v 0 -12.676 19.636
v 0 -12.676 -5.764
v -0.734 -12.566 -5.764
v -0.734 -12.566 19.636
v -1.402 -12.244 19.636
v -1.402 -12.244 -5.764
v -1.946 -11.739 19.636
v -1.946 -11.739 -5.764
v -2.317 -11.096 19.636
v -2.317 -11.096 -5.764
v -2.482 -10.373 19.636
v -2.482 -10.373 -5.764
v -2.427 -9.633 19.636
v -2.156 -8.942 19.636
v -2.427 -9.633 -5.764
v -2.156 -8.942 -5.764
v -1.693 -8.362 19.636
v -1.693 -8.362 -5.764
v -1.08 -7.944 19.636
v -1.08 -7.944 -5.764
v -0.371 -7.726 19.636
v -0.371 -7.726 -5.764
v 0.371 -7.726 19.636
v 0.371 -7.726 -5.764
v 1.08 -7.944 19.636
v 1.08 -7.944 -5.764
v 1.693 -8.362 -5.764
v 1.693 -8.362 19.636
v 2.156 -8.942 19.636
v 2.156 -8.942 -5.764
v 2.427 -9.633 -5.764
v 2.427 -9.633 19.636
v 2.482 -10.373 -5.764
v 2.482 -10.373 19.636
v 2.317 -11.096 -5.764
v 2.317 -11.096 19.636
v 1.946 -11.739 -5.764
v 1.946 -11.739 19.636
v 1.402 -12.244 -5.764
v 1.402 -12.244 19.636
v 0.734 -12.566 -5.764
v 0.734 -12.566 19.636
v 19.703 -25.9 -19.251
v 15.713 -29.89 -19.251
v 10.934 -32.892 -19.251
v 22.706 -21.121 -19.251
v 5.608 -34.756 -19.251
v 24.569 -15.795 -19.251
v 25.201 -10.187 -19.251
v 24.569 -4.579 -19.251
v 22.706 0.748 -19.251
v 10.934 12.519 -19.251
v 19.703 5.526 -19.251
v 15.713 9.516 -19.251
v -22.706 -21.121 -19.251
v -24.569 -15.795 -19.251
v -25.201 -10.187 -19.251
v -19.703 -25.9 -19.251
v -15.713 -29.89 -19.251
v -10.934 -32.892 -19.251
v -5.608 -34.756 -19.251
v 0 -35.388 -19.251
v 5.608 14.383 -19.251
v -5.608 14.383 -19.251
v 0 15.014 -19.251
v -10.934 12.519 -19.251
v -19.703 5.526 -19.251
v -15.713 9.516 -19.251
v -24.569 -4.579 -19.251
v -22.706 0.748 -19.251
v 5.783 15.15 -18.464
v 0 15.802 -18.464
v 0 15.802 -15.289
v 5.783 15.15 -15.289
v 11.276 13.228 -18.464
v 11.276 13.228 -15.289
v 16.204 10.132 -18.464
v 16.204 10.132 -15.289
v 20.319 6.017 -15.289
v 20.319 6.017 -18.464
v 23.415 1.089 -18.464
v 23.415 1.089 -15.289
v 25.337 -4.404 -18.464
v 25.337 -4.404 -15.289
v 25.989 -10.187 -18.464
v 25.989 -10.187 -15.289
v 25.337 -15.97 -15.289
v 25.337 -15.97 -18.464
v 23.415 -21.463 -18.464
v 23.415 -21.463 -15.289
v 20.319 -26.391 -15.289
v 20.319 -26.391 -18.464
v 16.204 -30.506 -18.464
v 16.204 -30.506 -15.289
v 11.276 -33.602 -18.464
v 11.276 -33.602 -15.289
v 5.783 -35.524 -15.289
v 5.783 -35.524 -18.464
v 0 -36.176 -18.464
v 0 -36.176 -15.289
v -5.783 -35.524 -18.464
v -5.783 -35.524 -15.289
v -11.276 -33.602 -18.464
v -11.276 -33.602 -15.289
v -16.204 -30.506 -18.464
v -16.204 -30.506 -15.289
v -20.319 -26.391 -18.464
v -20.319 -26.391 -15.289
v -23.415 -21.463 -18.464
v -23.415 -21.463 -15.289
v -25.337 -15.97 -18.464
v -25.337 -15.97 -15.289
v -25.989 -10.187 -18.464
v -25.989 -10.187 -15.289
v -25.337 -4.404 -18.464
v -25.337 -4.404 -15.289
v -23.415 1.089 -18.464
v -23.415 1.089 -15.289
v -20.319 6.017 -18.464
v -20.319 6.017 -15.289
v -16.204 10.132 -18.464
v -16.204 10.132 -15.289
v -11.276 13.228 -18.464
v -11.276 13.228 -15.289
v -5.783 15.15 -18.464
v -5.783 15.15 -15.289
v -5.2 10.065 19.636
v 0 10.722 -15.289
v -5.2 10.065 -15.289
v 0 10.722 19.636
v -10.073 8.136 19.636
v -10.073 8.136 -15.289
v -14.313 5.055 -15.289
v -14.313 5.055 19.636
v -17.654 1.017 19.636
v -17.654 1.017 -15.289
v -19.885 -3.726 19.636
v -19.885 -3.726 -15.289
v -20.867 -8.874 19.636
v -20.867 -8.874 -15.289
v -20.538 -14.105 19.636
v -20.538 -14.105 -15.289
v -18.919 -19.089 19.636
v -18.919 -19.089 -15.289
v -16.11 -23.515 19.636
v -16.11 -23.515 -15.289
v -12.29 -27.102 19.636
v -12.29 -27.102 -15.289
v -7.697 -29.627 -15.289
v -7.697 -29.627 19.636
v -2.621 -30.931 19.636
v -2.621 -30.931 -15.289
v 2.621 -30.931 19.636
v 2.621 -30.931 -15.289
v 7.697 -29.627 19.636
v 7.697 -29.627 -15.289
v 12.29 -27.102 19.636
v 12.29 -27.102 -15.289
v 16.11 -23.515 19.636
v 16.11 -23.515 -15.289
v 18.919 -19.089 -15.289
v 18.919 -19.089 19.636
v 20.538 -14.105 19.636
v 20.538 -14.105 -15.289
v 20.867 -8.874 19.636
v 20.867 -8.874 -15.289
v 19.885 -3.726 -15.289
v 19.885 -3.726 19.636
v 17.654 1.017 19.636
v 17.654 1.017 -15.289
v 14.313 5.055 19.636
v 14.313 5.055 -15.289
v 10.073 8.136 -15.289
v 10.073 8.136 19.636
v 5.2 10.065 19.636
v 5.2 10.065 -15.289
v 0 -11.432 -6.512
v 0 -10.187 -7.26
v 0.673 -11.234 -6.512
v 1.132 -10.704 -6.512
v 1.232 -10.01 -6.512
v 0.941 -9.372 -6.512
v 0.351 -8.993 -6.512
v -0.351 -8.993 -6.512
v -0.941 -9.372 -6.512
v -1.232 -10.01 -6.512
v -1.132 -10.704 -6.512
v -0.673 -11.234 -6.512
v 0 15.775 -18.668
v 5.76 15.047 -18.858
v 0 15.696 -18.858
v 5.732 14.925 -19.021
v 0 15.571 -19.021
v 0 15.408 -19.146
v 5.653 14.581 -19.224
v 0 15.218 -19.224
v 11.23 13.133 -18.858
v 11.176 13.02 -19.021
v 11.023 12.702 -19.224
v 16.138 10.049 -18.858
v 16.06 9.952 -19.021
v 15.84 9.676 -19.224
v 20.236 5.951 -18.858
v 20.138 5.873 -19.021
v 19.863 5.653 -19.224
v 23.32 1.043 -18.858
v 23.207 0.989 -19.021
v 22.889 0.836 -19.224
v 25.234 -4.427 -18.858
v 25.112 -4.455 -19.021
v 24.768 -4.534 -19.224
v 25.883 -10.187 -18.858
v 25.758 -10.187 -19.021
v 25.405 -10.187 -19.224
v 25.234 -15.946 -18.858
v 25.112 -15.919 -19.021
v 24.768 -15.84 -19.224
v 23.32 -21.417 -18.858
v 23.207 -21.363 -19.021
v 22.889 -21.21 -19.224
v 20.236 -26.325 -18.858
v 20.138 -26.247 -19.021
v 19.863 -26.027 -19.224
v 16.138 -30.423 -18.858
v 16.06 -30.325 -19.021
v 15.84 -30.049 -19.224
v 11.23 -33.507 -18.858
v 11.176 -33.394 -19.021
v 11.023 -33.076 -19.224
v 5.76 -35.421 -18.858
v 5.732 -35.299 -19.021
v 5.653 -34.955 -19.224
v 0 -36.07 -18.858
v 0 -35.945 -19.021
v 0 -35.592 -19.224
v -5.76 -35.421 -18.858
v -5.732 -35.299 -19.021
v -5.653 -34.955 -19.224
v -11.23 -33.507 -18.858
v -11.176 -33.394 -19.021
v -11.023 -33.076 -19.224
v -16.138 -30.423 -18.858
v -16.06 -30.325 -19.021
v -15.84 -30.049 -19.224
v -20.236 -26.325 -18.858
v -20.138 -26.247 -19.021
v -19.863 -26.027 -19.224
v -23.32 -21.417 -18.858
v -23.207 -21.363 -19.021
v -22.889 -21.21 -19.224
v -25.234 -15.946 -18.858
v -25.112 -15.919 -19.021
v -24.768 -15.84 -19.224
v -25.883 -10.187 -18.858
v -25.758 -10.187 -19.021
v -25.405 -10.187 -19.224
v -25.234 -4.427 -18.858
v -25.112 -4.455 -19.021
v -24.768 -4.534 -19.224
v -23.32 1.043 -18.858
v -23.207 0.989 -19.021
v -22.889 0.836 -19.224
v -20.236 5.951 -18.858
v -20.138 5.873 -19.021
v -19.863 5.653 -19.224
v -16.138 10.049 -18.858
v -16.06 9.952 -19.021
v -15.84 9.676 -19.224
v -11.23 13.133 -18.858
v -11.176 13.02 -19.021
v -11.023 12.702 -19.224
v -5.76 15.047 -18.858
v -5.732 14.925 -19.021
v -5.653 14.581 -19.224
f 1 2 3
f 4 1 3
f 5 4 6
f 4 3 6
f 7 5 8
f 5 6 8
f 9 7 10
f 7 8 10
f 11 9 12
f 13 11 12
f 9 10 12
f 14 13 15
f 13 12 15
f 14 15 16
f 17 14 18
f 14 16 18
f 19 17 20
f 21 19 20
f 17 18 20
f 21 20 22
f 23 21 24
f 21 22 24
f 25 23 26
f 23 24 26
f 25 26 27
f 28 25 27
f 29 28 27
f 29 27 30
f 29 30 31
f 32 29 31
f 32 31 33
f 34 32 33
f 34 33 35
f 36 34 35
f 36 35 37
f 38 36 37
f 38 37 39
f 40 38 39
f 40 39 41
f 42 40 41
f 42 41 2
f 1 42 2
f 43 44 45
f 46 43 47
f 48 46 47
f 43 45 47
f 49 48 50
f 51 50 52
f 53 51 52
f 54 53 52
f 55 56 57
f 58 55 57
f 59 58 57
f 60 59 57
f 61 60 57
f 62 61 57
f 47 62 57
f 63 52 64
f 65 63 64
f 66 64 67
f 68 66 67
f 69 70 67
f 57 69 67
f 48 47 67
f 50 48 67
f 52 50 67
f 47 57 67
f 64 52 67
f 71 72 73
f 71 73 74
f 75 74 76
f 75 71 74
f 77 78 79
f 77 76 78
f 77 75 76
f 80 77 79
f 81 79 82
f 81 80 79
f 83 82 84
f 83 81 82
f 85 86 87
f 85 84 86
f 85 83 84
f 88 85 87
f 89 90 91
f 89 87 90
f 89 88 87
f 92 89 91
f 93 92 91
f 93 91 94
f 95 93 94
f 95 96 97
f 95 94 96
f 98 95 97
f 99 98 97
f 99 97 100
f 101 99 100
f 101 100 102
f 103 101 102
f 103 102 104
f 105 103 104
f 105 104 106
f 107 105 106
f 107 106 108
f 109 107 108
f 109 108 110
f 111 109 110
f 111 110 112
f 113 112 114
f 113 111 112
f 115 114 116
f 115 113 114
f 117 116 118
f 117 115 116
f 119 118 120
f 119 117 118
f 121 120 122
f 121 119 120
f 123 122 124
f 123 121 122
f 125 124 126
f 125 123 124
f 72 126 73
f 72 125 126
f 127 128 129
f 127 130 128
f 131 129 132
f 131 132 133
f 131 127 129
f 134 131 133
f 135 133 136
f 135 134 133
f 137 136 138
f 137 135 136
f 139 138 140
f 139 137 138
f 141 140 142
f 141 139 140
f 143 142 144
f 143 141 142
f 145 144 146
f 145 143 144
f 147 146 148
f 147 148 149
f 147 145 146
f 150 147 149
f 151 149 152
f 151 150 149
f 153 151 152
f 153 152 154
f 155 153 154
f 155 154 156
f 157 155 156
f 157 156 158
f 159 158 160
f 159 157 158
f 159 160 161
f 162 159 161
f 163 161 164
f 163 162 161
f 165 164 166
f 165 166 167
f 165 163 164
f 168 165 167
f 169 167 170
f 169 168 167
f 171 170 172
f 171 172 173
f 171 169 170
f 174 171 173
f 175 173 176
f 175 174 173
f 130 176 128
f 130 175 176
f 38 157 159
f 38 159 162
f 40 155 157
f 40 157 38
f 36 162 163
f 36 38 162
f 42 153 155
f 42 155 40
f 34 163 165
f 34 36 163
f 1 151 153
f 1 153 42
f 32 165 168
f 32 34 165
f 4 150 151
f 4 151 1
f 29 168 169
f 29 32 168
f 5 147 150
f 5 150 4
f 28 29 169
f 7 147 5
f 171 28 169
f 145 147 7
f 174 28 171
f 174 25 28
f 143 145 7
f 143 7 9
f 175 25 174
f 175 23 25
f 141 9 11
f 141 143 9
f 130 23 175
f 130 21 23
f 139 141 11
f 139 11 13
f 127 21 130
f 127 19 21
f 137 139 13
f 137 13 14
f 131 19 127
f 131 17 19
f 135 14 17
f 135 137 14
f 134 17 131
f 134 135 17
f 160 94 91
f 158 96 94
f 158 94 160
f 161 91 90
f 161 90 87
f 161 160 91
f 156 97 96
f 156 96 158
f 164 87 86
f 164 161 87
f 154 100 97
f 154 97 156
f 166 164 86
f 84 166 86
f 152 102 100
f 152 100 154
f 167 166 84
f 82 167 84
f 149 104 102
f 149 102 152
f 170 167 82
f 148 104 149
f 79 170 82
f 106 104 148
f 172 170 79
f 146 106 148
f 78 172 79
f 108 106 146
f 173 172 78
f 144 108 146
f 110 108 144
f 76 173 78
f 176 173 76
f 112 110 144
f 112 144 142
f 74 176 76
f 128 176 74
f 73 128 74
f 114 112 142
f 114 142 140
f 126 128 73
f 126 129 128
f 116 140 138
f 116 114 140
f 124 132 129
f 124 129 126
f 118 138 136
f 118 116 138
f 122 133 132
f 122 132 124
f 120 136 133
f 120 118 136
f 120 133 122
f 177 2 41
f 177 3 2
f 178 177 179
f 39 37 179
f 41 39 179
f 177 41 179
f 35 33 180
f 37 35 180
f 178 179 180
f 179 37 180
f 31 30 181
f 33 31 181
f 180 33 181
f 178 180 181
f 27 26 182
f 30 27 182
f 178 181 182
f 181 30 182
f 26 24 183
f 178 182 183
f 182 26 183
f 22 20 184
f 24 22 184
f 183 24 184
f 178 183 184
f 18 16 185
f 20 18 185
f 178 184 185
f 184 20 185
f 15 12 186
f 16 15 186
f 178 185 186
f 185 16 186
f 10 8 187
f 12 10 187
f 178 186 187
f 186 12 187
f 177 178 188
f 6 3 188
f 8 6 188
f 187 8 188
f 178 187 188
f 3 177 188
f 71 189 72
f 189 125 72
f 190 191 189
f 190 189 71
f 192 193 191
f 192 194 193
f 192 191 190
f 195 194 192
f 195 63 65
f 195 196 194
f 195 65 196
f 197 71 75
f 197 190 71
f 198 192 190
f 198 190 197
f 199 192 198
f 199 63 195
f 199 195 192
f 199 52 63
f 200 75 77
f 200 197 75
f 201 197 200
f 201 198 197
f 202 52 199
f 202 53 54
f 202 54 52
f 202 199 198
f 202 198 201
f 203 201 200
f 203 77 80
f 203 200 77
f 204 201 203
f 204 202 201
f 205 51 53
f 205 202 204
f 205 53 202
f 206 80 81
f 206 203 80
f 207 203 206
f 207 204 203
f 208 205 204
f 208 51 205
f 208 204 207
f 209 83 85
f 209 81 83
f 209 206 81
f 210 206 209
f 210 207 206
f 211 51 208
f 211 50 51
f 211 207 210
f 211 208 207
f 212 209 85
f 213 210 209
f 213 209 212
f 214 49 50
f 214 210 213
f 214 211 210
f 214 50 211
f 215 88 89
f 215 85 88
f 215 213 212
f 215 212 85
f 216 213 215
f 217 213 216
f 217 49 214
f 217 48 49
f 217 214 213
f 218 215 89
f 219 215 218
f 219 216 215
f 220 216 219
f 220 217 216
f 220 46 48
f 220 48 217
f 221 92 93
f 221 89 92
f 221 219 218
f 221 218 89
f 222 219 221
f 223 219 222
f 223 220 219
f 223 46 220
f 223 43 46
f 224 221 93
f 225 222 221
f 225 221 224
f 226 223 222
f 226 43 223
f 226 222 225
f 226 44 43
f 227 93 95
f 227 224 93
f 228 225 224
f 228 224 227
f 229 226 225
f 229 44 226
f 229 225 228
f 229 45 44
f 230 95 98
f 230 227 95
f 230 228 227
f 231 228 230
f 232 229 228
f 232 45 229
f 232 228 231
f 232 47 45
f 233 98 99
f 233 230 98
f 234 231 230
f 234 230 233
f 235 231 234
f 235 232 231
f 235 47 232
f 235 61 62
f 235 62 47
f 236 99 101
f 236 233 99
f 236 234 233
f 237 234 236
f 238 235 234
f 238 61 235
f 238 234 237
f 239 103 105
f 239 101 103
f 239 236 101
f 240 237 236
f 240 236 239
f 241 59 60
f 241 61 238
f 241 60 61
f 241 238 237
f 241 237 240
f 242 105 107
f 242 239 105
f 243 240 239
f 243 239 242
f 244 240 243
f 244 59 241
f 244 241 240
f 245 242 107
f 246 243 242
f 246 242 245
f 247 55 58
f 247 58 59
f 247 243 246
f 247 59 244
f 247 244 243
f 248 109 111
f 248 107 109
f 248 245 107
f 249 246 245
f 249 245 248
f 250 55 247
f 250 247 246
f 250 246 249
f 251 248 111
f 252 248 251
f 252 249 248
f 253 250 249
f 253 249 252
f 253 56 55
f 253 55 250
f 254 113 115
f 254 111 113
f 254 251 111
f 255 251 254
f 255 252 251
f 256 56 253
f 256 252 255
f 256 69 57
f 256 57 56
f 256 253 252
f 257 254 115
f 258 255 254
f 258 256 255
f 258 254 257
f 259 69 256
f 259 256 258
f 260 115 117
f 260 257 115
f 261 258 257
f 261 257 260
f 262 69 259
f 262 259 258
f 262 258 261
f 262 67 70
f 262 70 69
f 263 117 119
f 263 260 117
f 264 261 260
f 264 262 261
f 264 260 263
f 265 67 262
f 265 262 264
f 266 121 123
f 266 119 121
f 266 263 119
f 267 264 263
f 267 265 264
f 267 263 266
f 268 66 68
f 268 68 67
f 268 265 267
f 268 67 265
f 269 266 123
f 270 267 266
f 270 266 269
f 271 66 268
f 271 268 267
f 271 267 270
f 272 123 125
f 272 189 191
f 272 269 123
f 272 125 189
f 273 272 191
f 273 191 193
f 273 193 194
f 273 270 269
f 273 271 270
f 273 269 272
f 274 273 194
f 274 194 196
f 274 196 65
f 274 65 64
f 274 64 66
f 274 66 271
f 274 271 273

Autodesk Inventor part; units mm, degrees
ref_plane "YZ Plane" through (0, 0, 0) normal (1, 0, 0) x (0, 1, 0)
ref_plane "XZ Plane" through (0, 0, 0) normal (0, 1, 0) x (-1, 0, 0)
ref_plane "XY Plane" through (0, 0, 0) normal (0, 0, 1) x (1, 0, 0)
sketch "Sketch1" plane through (0, 0, 0) normal (1, 0, 0) x (0, 1, 0)
  line L0 (10.7218, 19.6361) -> (-10.1869, 19.6361)
  line L1 (-10.1869, 19.6361) -> (-10.1869, -15.2669)
  line L2 (10.7218, -15.2889) -> (10.7218, 19.6361)
  line L3 (10.7218, -15.2889) -> (15.8018, -15.2889)
  line L4 (15.8018, -15.2889) -> (15.8018, -19.2513)
  line L5 (15.8018, -19.2513) -> (-10.1869, -19.2513)
  line L6 (-10.1869, -15.2669) -> (-10.1869, -19.2513)
  line L7 (15.8018, -19.2513) -> (-11.1857, -19.2513) construction
  line L8 (-10.1869, -19.2513) -> (-10.1869, 35.0894) construction
  point P0 (0, 0)
  dimension "d0" = 3.9624
  dimension "d1" = 38.8874
  dimension "d2" = 5.08
  dimension "d4" = 26.9875
revolve "Revolution1" add sketch "Sketch1" angle 360 about axis through (0, -10.1869, -19.2513) along (0, 0, 1)
sketch "Sketch2" plane through (0, -10.1869, 19.6361) normal (0, 0, 1) x (1, 0, 0)
  point P0 (0, 10.1869)
  point P1 (0, 0)
hole "Hole1" at (0, -10.1869, 19.6361) direction (0, 0, -1) diameter 4.9784 depth 25.4 tip angle 118 thread size "1/4-20 UNC" class "2B" standard "ANSI Unified Screw Threads"
fillet "Fillet1" radius 0.7874 1 edges at (0, -36.1756, -19.2513)
properties part number "lower die 1 center" material "Steel"
